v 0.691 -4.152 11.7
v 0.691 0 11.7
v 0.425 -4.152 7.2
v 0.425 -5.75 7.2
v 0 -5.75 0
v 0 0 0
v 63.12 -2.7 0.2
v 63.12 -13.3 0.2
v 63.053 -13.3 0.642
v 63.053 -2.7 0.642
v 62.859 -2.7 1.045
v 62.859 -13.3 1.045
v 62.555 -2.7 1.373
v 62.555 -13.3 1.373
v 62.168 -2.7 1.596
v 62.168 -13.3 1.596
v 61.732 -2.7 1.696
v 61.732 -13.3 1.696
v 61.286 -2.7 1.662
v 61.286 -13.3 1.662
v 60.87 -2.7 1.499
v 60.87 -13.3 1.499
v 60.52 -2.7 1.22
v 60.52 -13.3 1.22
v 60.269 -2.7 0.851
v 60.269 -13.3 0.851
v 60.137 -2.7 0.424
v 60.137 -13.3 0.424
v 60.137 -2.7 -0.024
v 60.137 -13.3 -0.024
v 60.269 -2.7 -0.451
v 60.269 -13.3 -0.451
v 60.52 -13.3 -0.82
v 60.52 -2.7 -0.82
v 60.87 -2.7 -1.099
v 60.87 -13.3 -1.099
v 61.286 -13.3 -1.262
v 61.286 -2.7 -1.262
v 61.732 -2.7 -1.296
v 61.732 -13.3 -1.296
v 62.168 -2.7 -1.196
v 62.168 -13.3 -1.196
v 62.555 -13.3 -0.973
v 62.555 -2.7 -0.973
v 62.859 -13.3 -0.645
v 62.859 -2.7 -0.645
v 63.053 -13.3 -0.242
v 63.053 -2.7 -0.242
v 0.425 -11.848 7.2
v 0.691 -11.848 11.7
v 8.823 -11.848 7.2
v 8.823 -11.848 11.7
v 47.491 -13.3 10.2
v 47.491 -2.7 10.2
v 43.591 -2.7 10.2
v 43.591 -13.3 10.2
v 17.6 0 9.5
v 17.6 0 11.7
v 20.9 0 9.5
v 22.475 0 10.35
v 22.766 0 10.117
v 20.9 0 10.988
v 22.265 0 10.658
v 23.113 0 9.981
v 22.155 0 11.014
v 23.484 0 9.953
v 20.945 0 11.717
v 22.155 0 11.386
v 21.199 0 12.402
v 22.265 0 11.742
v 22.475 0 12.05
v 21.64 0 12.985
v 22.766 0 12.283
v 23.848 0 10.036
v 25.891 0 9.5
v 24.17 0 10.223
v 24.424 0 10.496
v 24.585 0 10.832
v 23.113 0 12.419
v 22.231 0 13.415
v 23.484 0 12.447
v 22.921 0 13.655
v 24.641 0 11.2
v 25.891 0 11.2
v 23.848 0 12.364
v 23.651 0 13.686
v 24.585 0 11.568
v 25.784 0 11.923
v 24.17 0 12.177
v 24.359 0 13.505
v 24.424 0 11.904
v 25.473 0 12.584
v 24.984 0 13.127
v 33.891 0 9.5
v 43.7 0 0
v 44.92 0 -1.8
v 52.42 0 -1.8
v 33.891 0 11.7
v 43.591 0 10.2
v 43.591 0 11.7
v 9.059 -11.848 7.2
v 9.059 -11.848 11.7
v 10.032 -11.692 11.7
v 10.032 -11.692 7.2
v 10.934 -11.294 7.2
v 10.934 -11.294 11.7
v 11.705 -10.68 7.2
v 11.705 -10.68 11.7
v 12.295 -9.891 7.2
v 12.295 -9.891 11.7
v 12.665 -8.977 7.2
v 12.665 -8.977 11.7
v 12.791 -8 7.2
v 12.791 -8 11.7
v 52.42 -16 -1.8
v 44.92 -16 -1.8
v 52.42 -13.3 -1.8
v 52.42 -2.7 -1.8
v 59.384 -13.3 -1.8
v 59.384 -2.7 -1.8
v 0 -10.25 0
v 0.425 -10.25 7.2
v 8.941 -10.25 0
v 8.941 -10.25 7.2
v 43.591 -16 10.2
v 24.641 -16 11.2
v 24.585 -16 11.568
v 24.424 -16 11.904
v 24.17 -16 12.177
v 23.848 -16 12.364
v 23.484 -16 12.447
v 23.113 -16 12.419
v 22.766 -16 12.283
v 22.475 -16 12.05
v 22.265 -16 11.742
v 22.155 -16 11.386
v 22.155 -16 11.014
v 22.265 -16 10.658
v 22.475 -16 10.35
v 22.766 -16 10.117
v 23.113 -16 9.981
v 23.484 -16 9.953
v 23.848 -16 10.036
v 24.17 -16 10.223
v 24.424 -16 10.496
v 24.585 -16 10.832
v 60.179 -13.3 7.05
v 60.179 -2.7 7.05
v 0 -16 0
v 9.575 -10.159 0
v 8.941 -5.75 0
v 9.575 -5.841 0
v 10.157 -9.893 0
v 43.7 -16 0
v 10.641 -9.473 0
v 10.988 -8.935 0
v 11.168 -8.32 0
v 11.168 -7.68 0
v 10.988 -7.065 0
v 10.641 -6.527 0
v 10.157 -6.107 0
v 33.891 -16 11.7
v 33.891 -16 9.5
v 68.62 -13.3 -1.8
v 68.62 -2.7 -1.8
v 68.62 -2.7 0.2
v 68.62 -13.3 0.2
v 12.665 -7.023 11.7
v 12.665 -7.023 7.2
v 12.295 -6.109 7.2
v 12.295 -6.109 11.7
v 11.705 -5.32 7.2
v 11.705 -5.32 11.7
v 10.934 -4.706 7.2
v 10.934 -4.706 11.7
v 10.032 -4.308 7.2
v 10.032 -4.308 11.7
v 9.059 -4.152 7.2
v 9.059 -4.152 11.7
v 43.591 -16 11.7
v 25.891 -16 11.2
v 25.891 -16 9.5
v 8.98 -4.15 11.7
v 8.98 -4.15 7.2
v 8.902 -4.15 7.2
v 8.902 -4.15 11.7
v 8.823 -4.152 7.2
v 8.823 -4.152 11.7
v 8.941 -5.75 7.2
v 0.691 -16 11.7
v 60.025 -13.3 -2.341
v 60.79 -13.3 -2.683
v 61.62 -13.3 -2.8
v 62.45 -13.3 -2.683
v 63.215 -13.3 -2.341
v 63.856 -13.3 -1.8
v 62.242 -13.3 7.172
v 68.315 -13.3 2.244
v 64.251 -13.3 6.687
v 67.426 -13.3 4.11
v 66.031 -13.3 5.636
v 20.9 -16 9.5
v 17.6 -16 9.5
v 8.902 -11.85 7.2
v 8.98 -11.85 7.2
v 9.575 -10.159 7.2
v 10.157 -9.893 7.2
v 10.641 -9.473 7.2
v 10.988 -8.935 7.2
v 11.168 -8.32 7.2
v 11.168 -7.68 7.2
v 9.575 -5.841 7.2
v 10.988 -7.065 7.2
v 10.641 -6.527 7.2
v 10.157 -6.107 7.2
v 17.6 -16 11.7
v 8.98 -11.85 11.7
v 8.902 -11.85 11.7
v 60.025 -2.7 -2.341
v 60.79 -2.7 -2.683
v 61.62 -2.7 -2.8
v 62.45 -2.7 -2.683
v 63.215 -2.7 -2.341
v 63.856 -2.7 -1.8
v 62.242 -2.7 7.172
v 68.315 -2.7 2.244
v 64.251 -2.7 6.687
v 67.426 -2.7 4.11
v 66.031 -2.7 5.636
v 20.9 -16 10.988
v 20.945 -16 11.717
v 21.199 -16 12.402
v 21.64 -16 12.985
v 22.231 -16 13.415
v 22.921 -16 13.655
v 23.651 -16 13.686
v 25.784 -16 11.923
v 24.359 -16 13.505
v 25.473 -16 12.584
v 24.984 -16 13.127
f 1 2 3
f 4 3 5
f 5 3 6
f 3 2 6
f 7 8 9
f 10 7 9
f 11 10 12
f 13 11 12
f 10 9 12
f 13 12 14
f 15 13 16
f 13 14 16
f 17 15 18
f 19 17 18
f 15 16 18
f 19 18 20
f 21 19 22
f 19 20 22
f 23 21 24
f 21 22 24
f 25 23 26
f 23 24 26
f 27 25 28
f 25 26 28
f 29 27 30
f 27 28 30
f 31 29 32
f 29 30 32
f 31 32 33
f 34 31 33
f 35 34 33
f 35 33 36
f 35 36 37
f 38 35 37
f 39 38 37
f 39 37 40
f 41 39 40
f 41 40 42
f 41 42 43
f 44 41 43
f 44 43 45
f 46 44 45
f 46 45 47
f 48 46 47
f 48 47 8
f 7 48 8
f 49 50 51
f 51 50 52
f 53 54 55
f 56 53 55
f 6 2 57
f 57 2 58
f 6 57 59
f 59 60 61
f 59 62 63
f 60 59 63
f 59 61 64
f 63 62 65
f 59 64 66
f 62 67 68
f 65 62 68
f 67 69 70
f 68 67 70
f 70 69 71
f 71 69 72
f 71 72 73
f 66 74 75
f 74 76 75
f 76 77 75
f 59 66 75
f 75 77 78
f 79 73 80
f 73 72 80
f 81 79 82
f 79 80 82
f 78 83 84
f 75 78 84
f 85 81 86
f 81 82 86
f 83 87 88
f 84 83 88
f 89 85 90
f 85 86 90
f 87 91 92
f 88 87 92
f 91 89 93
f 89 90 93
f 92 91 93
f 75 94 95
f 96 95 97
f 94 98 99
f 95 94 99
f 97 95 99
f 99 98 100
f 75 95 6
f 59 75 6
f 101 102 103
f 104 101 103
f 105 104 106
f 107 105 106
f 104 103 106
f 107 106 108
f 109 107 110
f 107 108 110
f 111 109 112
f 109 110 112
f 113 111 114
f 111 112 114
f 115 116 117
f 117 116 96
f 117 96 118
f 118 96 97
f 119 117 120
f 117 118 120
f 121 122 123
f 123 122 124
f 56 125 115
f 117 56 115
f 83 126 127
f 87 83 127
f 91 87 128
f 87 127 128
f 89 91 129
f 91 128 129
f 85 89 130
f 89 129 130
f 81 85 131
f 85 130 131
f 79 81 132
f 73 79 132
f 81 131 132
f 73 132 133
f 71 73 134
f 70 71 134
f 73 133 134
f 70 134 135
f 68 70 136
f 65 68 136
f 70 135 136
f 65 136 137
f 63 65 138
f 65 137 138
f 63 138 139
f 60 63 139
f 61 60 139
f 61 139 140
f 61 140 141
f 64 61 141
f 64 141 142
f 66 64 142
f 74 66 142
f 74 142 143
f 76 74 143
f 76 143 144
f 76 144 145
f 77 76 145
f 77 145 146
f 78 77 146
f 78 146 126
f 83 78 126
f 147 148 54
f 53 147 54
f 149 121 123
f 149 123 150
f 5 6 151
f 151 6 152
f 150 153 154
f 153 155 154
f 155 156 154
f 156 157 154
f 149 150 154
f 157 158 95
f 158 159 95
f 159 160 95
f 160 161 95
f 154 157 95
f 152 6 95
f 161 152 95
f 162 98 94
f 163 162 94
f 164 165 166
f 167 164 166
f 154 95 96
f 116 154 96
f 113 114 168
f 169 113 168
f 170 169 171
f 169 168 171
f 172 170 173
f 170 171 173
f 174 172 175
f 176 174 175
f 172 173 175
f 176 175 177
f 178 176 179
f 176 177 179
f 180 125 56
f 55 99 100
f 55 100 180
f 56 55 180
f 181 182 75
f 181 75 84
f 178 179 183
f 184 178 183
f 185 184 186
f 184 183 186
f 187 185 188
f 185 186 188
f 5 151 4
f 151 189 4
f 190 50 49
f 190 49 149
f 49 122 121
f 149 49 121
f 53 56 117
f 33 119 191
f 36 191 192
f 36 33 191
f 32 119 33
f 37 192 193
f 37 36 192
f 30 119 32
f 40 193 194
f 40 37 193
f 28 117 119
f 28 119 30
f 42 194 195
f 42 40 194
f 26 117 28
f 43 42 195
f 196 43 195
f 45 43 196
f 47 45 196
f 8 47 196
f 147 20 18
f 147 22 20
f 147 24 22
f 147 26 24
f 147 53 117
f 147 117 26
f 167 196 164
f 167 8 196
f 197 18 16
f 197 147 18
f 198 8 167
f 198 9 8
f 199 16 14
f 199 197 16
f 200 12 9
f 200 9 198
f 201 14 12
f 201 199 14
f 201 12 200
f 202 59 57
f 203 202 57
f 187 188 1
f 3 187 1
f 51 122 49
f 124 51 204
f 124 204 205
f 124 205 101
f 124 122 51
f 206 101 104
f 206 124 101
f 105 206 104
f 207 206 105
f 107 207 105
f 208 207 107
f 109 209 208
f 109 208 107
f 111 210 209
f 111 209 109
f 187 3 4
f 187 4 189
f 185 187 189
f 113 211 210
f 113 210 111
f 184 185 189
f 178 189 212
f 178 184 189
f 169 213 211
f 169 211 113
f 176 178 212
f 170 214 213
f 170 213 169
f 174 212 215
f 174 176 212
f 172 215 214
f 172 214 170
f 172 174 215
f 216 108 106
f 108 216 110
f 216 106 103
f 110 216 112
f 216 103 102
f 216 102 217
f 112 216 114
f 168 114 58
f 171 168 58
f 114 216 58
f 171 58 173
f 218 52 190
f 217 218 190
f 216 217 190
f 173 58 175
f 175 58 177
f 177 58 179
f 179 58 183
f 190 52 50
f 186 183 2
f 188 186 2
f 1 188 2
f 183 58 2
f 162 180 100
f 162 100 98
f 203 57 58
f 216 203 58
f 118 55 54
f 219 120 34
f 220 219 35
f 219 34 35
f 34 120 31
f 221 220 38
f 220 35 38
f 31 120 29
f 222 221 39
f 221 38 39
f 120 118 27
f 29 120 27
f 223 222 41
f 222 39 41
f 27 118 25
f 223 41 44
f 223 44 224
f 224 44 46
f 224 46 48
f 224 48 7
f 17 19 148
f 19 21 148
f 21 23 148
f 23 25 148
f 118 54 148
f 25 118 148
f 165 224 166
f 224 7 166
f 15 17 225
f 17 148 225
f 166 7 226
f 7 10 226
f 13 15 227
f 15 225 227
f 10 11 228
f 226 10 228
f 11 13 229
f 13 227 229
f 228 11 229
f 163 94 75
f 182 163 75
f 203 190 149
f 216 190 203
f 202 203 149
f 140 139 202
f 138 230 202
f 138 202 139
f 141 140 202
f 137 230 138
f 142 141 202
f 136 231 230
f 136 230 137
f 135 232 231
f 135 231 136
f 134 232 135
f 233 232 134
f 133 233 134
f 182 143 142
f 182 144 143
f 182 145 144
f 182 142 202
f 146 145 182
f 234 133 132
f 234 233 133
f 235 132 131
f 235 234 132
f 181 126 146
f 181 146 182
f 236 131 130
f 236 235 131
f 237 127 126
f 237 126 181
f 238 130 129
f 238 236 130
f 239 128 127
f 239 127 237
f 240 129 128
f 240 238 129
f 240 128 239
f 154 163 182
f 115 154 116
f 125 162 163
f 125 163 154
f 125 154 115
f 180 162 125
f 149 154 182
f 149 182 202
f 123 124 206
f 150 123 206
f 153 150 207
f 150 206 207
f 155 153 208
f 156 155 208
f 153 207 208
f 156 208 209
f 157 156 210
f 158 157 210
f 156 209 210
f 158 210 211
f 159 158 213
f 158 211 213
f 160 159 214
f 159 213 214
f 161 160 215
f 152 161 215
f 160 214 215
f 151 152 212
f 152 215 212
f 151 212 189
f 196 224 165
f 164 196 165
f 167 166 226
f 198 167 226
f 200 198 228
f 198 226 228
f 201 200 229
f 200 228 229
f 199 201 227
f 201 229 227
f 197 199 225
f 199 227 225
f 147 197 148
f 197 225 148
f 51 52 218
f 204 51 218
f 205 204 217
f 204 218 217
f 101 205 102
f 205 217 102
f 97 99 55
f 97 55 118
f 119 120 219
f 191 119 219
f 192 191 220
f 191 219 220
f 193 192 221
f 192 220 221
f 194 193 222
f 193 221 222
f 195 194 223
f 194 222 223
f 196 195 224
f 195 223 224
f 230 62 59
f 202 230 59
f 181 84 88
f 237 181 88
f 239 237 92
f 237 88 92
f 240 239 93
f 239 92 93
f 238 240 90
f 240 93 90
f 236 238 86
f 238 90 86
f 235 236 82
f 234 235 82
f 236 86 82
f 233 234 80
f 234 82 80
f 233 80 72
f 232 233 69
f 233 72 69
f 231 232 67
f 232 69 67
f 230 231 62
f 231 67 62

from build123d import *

# Parameters (mm, degrees)
F1_DEPTH  = 16
F2_R      = 1.5
F2_R_2    = 1.25
F3_DEPTH  = 16.001
F5_DEPTH  = 2.7
F8_DEPTH  = 14.501
F9_DEPTH  = 25
F11_DEPTH = 4.5


# Not quite as in the source:
# - a pattern or mirror of a feature is missing from the dataset's text; its kind, count and spacing are read off the source's solid


with BuildPart() as f1:
    # F0 (on Front) → F1 (new body)
    with BuildSketch(Plane.XZ):
        with BuildLine():
            Line((0.6909776407, 11.7), (0, 0))
            Line((0, 0), (43.7, 0))
            Line((43.7, 0), (44.92, -1.8))
            Line((44.92, -1.8), (59.3839320225, -1.8))
            ThreePointArc((59.3839320225, -1.8), (61.62, -2.8), (63.8560679775, -1.8))
            Line((63.8560679775, -1.8), (68.62, -1.8))
            Line((68.62, -1.8), (68.62, 0.2))
            ThreePointArc((68.62, 0.2), (66.0308120163, 5.6355070929), (60.1786464695, 7.05))
            Line((60.1786464695, 7.05), (47.4909776407, 10.2))
            Line((47.4909776407, 10.2), (43.5909776407, 10.2))
            Line((43.5909776407, 10.2), (43.5909776407, 11.7))
            Line((43.5909776407, 11.7), (33.8909776407, 11.7))
            Line((33.8909776407, 11.7), (33.8909776407, 9.5))
            Line((33.8909776407, 9.5), (25.8909776407, 9.5))
            Line((25.8909776407, 9.5), (25.8909776407, 11.2))
            ThreePointArc((25.8909776407, 11.2), (23.2847799515, 13.6977433917), (20.9, 10.9877963389))
            Line((20.9, 10.9877963389), (20.9, 9.5))
            Line((20.9, 9.5), (17.6, 9.5))
            Line((17.6, 9.5), (17.6, 11.7))
            Line((17.6, 11.7), (0.6909776407, 11.7))
        make_face()
    extrude(amount=F1_DEPTH)

    # F2 (on face) → F3 (cut, through all)
    with BuildSketch(Plane.XZ.offset(16)):
        with Locations((61.62, 0.2)):
            Circle(F2_R)
        with Locations((23.3909776407, 11.2)):
            Circle(F2_R_2)
    extrude(amount=-F3_DEPTH, mode=Mode.SUBTRACT)

    # F4 (on face) → F5 (cut)
    with BuildSketch(Plane.XZ.offset(16)):
        Polygon((69.0573006868, 10.2), (43.5909776407, 10.2), (52.42, -1.8), (58.7147176266, -4.3849991634), (70.332378149, -4.3849991634), align=None)
    f5 = extrude(amount=-F5_DEPTH, mode=Mode.SUBTRACT)

    # F5_copies: F5 across plane
    add(f5.mirror(Plane.ZX.offset(-8)), mode=Mode.SUBTRACT)

    # F7 (on face) → F8 (cut, through all)
    with BuildSketch(Plane.XY.offset(11.7)):
        with BuildLine():
            Line((8.9409776407, -5.75), (0.6909776407, -5.75))
            Line((0.6909776407, -5.75), (0.6909776407, -10.25))
            Line((0.6909776407, -10.25), (8.9409776407, -10.25))
            ThreePointArc((8.9409776407, -10.25), (11.1909776407, -8), (8.9409776407, -5.75))
        make_face()
    extrude(amount=-F8_DEPTH, mode=Mode.SUBTRACT)

    # F7 (on face) → F9 (cut)
    with BuildSketch(Plane.XY.offset(11.7)):
        with BuildLine():
            Line((8.9409776407, -5.75), (0.6909776407, -5.75))
            Line((0.6909776407, -5.75), (-0.8989692941, -5.75))
            Line((-0.8989692941, -5.75), (-0.8989692941, -10.25))
            Line((-0.8989692941, -10.25), (0.6909776407, -10.25))
            Line((0.6909776407, -10.25), (8.9409776407, -10.25))
            ThreePointArc((8.9409776407, -10.25), (11.1909776407, -8), (8.9409776407, -5.75))
        make_face()
    extrude(amount=-F9_DEPTH, mode=Mode.SUBTRACT)

    # F10 (on face) → F11 (cut)
    with BuildSketch(Plane.XY.offset(11.7)):
        with BuildLine():
            ThreePointArc((9.0590238842, -11.8481898452), (11.7047592925, -10.6803005393), (12.7909776407, -8))
            ThreePointArc((12.7909776407, -8), (11.7048621847, -5.3198055617), (9.0593193409, -4.1518192296))
            Line((9.0593193409, -4.1518192296), (8.8226359404, -4.1518192296))
            ThreePointArc((8.8226359404, -4.1518192296), (5.0909776435, -8.000147798), (8.8229313971, -11.8481898452))
            Line((8.8229313971, -11.8481898452), (9.0590238842, -11.8481898452))
        make_face()
        with BuildLine():
            Line((8.8226359404, -4.1518192296), (9.0593193409, -4.1518192296))
            ThreePointArc((9.0593193409, -4.1518192296), (8.9409776407, -4.15), (8.8226359404, -4.1518192296))
        make_face()
        with BuildLine():
            ThreePointArc((8.8229313971, -11.8481898452), (8.9409776407, -11.85), (9.0590238842, -11.8481898452))
            Line((9.0590238842, -11.8481898452), (8.8229313971, -11.8481898452))
        make_face()
        with BuildLine():
            ThreePointArc((8.8229313971, -11.8481898452), (5.0909776435, -8.000147798), (8.8226359404, -4.1518192296))
            Line((8.8226359404, -4.1518192296), (-1.5180813544, -4.1518192296))
            Line((-1.5180813544, -4.1518192296), (-2.6164921116, -11.8481898452))
            Line((-2.6164921116, -11.8481898452), (8.8229313971, -11.8481898452))
        make_face()
    extrude(amount=-F11_DEPTH, mode=Mode.SUBTRACT)


solid = f1.part
